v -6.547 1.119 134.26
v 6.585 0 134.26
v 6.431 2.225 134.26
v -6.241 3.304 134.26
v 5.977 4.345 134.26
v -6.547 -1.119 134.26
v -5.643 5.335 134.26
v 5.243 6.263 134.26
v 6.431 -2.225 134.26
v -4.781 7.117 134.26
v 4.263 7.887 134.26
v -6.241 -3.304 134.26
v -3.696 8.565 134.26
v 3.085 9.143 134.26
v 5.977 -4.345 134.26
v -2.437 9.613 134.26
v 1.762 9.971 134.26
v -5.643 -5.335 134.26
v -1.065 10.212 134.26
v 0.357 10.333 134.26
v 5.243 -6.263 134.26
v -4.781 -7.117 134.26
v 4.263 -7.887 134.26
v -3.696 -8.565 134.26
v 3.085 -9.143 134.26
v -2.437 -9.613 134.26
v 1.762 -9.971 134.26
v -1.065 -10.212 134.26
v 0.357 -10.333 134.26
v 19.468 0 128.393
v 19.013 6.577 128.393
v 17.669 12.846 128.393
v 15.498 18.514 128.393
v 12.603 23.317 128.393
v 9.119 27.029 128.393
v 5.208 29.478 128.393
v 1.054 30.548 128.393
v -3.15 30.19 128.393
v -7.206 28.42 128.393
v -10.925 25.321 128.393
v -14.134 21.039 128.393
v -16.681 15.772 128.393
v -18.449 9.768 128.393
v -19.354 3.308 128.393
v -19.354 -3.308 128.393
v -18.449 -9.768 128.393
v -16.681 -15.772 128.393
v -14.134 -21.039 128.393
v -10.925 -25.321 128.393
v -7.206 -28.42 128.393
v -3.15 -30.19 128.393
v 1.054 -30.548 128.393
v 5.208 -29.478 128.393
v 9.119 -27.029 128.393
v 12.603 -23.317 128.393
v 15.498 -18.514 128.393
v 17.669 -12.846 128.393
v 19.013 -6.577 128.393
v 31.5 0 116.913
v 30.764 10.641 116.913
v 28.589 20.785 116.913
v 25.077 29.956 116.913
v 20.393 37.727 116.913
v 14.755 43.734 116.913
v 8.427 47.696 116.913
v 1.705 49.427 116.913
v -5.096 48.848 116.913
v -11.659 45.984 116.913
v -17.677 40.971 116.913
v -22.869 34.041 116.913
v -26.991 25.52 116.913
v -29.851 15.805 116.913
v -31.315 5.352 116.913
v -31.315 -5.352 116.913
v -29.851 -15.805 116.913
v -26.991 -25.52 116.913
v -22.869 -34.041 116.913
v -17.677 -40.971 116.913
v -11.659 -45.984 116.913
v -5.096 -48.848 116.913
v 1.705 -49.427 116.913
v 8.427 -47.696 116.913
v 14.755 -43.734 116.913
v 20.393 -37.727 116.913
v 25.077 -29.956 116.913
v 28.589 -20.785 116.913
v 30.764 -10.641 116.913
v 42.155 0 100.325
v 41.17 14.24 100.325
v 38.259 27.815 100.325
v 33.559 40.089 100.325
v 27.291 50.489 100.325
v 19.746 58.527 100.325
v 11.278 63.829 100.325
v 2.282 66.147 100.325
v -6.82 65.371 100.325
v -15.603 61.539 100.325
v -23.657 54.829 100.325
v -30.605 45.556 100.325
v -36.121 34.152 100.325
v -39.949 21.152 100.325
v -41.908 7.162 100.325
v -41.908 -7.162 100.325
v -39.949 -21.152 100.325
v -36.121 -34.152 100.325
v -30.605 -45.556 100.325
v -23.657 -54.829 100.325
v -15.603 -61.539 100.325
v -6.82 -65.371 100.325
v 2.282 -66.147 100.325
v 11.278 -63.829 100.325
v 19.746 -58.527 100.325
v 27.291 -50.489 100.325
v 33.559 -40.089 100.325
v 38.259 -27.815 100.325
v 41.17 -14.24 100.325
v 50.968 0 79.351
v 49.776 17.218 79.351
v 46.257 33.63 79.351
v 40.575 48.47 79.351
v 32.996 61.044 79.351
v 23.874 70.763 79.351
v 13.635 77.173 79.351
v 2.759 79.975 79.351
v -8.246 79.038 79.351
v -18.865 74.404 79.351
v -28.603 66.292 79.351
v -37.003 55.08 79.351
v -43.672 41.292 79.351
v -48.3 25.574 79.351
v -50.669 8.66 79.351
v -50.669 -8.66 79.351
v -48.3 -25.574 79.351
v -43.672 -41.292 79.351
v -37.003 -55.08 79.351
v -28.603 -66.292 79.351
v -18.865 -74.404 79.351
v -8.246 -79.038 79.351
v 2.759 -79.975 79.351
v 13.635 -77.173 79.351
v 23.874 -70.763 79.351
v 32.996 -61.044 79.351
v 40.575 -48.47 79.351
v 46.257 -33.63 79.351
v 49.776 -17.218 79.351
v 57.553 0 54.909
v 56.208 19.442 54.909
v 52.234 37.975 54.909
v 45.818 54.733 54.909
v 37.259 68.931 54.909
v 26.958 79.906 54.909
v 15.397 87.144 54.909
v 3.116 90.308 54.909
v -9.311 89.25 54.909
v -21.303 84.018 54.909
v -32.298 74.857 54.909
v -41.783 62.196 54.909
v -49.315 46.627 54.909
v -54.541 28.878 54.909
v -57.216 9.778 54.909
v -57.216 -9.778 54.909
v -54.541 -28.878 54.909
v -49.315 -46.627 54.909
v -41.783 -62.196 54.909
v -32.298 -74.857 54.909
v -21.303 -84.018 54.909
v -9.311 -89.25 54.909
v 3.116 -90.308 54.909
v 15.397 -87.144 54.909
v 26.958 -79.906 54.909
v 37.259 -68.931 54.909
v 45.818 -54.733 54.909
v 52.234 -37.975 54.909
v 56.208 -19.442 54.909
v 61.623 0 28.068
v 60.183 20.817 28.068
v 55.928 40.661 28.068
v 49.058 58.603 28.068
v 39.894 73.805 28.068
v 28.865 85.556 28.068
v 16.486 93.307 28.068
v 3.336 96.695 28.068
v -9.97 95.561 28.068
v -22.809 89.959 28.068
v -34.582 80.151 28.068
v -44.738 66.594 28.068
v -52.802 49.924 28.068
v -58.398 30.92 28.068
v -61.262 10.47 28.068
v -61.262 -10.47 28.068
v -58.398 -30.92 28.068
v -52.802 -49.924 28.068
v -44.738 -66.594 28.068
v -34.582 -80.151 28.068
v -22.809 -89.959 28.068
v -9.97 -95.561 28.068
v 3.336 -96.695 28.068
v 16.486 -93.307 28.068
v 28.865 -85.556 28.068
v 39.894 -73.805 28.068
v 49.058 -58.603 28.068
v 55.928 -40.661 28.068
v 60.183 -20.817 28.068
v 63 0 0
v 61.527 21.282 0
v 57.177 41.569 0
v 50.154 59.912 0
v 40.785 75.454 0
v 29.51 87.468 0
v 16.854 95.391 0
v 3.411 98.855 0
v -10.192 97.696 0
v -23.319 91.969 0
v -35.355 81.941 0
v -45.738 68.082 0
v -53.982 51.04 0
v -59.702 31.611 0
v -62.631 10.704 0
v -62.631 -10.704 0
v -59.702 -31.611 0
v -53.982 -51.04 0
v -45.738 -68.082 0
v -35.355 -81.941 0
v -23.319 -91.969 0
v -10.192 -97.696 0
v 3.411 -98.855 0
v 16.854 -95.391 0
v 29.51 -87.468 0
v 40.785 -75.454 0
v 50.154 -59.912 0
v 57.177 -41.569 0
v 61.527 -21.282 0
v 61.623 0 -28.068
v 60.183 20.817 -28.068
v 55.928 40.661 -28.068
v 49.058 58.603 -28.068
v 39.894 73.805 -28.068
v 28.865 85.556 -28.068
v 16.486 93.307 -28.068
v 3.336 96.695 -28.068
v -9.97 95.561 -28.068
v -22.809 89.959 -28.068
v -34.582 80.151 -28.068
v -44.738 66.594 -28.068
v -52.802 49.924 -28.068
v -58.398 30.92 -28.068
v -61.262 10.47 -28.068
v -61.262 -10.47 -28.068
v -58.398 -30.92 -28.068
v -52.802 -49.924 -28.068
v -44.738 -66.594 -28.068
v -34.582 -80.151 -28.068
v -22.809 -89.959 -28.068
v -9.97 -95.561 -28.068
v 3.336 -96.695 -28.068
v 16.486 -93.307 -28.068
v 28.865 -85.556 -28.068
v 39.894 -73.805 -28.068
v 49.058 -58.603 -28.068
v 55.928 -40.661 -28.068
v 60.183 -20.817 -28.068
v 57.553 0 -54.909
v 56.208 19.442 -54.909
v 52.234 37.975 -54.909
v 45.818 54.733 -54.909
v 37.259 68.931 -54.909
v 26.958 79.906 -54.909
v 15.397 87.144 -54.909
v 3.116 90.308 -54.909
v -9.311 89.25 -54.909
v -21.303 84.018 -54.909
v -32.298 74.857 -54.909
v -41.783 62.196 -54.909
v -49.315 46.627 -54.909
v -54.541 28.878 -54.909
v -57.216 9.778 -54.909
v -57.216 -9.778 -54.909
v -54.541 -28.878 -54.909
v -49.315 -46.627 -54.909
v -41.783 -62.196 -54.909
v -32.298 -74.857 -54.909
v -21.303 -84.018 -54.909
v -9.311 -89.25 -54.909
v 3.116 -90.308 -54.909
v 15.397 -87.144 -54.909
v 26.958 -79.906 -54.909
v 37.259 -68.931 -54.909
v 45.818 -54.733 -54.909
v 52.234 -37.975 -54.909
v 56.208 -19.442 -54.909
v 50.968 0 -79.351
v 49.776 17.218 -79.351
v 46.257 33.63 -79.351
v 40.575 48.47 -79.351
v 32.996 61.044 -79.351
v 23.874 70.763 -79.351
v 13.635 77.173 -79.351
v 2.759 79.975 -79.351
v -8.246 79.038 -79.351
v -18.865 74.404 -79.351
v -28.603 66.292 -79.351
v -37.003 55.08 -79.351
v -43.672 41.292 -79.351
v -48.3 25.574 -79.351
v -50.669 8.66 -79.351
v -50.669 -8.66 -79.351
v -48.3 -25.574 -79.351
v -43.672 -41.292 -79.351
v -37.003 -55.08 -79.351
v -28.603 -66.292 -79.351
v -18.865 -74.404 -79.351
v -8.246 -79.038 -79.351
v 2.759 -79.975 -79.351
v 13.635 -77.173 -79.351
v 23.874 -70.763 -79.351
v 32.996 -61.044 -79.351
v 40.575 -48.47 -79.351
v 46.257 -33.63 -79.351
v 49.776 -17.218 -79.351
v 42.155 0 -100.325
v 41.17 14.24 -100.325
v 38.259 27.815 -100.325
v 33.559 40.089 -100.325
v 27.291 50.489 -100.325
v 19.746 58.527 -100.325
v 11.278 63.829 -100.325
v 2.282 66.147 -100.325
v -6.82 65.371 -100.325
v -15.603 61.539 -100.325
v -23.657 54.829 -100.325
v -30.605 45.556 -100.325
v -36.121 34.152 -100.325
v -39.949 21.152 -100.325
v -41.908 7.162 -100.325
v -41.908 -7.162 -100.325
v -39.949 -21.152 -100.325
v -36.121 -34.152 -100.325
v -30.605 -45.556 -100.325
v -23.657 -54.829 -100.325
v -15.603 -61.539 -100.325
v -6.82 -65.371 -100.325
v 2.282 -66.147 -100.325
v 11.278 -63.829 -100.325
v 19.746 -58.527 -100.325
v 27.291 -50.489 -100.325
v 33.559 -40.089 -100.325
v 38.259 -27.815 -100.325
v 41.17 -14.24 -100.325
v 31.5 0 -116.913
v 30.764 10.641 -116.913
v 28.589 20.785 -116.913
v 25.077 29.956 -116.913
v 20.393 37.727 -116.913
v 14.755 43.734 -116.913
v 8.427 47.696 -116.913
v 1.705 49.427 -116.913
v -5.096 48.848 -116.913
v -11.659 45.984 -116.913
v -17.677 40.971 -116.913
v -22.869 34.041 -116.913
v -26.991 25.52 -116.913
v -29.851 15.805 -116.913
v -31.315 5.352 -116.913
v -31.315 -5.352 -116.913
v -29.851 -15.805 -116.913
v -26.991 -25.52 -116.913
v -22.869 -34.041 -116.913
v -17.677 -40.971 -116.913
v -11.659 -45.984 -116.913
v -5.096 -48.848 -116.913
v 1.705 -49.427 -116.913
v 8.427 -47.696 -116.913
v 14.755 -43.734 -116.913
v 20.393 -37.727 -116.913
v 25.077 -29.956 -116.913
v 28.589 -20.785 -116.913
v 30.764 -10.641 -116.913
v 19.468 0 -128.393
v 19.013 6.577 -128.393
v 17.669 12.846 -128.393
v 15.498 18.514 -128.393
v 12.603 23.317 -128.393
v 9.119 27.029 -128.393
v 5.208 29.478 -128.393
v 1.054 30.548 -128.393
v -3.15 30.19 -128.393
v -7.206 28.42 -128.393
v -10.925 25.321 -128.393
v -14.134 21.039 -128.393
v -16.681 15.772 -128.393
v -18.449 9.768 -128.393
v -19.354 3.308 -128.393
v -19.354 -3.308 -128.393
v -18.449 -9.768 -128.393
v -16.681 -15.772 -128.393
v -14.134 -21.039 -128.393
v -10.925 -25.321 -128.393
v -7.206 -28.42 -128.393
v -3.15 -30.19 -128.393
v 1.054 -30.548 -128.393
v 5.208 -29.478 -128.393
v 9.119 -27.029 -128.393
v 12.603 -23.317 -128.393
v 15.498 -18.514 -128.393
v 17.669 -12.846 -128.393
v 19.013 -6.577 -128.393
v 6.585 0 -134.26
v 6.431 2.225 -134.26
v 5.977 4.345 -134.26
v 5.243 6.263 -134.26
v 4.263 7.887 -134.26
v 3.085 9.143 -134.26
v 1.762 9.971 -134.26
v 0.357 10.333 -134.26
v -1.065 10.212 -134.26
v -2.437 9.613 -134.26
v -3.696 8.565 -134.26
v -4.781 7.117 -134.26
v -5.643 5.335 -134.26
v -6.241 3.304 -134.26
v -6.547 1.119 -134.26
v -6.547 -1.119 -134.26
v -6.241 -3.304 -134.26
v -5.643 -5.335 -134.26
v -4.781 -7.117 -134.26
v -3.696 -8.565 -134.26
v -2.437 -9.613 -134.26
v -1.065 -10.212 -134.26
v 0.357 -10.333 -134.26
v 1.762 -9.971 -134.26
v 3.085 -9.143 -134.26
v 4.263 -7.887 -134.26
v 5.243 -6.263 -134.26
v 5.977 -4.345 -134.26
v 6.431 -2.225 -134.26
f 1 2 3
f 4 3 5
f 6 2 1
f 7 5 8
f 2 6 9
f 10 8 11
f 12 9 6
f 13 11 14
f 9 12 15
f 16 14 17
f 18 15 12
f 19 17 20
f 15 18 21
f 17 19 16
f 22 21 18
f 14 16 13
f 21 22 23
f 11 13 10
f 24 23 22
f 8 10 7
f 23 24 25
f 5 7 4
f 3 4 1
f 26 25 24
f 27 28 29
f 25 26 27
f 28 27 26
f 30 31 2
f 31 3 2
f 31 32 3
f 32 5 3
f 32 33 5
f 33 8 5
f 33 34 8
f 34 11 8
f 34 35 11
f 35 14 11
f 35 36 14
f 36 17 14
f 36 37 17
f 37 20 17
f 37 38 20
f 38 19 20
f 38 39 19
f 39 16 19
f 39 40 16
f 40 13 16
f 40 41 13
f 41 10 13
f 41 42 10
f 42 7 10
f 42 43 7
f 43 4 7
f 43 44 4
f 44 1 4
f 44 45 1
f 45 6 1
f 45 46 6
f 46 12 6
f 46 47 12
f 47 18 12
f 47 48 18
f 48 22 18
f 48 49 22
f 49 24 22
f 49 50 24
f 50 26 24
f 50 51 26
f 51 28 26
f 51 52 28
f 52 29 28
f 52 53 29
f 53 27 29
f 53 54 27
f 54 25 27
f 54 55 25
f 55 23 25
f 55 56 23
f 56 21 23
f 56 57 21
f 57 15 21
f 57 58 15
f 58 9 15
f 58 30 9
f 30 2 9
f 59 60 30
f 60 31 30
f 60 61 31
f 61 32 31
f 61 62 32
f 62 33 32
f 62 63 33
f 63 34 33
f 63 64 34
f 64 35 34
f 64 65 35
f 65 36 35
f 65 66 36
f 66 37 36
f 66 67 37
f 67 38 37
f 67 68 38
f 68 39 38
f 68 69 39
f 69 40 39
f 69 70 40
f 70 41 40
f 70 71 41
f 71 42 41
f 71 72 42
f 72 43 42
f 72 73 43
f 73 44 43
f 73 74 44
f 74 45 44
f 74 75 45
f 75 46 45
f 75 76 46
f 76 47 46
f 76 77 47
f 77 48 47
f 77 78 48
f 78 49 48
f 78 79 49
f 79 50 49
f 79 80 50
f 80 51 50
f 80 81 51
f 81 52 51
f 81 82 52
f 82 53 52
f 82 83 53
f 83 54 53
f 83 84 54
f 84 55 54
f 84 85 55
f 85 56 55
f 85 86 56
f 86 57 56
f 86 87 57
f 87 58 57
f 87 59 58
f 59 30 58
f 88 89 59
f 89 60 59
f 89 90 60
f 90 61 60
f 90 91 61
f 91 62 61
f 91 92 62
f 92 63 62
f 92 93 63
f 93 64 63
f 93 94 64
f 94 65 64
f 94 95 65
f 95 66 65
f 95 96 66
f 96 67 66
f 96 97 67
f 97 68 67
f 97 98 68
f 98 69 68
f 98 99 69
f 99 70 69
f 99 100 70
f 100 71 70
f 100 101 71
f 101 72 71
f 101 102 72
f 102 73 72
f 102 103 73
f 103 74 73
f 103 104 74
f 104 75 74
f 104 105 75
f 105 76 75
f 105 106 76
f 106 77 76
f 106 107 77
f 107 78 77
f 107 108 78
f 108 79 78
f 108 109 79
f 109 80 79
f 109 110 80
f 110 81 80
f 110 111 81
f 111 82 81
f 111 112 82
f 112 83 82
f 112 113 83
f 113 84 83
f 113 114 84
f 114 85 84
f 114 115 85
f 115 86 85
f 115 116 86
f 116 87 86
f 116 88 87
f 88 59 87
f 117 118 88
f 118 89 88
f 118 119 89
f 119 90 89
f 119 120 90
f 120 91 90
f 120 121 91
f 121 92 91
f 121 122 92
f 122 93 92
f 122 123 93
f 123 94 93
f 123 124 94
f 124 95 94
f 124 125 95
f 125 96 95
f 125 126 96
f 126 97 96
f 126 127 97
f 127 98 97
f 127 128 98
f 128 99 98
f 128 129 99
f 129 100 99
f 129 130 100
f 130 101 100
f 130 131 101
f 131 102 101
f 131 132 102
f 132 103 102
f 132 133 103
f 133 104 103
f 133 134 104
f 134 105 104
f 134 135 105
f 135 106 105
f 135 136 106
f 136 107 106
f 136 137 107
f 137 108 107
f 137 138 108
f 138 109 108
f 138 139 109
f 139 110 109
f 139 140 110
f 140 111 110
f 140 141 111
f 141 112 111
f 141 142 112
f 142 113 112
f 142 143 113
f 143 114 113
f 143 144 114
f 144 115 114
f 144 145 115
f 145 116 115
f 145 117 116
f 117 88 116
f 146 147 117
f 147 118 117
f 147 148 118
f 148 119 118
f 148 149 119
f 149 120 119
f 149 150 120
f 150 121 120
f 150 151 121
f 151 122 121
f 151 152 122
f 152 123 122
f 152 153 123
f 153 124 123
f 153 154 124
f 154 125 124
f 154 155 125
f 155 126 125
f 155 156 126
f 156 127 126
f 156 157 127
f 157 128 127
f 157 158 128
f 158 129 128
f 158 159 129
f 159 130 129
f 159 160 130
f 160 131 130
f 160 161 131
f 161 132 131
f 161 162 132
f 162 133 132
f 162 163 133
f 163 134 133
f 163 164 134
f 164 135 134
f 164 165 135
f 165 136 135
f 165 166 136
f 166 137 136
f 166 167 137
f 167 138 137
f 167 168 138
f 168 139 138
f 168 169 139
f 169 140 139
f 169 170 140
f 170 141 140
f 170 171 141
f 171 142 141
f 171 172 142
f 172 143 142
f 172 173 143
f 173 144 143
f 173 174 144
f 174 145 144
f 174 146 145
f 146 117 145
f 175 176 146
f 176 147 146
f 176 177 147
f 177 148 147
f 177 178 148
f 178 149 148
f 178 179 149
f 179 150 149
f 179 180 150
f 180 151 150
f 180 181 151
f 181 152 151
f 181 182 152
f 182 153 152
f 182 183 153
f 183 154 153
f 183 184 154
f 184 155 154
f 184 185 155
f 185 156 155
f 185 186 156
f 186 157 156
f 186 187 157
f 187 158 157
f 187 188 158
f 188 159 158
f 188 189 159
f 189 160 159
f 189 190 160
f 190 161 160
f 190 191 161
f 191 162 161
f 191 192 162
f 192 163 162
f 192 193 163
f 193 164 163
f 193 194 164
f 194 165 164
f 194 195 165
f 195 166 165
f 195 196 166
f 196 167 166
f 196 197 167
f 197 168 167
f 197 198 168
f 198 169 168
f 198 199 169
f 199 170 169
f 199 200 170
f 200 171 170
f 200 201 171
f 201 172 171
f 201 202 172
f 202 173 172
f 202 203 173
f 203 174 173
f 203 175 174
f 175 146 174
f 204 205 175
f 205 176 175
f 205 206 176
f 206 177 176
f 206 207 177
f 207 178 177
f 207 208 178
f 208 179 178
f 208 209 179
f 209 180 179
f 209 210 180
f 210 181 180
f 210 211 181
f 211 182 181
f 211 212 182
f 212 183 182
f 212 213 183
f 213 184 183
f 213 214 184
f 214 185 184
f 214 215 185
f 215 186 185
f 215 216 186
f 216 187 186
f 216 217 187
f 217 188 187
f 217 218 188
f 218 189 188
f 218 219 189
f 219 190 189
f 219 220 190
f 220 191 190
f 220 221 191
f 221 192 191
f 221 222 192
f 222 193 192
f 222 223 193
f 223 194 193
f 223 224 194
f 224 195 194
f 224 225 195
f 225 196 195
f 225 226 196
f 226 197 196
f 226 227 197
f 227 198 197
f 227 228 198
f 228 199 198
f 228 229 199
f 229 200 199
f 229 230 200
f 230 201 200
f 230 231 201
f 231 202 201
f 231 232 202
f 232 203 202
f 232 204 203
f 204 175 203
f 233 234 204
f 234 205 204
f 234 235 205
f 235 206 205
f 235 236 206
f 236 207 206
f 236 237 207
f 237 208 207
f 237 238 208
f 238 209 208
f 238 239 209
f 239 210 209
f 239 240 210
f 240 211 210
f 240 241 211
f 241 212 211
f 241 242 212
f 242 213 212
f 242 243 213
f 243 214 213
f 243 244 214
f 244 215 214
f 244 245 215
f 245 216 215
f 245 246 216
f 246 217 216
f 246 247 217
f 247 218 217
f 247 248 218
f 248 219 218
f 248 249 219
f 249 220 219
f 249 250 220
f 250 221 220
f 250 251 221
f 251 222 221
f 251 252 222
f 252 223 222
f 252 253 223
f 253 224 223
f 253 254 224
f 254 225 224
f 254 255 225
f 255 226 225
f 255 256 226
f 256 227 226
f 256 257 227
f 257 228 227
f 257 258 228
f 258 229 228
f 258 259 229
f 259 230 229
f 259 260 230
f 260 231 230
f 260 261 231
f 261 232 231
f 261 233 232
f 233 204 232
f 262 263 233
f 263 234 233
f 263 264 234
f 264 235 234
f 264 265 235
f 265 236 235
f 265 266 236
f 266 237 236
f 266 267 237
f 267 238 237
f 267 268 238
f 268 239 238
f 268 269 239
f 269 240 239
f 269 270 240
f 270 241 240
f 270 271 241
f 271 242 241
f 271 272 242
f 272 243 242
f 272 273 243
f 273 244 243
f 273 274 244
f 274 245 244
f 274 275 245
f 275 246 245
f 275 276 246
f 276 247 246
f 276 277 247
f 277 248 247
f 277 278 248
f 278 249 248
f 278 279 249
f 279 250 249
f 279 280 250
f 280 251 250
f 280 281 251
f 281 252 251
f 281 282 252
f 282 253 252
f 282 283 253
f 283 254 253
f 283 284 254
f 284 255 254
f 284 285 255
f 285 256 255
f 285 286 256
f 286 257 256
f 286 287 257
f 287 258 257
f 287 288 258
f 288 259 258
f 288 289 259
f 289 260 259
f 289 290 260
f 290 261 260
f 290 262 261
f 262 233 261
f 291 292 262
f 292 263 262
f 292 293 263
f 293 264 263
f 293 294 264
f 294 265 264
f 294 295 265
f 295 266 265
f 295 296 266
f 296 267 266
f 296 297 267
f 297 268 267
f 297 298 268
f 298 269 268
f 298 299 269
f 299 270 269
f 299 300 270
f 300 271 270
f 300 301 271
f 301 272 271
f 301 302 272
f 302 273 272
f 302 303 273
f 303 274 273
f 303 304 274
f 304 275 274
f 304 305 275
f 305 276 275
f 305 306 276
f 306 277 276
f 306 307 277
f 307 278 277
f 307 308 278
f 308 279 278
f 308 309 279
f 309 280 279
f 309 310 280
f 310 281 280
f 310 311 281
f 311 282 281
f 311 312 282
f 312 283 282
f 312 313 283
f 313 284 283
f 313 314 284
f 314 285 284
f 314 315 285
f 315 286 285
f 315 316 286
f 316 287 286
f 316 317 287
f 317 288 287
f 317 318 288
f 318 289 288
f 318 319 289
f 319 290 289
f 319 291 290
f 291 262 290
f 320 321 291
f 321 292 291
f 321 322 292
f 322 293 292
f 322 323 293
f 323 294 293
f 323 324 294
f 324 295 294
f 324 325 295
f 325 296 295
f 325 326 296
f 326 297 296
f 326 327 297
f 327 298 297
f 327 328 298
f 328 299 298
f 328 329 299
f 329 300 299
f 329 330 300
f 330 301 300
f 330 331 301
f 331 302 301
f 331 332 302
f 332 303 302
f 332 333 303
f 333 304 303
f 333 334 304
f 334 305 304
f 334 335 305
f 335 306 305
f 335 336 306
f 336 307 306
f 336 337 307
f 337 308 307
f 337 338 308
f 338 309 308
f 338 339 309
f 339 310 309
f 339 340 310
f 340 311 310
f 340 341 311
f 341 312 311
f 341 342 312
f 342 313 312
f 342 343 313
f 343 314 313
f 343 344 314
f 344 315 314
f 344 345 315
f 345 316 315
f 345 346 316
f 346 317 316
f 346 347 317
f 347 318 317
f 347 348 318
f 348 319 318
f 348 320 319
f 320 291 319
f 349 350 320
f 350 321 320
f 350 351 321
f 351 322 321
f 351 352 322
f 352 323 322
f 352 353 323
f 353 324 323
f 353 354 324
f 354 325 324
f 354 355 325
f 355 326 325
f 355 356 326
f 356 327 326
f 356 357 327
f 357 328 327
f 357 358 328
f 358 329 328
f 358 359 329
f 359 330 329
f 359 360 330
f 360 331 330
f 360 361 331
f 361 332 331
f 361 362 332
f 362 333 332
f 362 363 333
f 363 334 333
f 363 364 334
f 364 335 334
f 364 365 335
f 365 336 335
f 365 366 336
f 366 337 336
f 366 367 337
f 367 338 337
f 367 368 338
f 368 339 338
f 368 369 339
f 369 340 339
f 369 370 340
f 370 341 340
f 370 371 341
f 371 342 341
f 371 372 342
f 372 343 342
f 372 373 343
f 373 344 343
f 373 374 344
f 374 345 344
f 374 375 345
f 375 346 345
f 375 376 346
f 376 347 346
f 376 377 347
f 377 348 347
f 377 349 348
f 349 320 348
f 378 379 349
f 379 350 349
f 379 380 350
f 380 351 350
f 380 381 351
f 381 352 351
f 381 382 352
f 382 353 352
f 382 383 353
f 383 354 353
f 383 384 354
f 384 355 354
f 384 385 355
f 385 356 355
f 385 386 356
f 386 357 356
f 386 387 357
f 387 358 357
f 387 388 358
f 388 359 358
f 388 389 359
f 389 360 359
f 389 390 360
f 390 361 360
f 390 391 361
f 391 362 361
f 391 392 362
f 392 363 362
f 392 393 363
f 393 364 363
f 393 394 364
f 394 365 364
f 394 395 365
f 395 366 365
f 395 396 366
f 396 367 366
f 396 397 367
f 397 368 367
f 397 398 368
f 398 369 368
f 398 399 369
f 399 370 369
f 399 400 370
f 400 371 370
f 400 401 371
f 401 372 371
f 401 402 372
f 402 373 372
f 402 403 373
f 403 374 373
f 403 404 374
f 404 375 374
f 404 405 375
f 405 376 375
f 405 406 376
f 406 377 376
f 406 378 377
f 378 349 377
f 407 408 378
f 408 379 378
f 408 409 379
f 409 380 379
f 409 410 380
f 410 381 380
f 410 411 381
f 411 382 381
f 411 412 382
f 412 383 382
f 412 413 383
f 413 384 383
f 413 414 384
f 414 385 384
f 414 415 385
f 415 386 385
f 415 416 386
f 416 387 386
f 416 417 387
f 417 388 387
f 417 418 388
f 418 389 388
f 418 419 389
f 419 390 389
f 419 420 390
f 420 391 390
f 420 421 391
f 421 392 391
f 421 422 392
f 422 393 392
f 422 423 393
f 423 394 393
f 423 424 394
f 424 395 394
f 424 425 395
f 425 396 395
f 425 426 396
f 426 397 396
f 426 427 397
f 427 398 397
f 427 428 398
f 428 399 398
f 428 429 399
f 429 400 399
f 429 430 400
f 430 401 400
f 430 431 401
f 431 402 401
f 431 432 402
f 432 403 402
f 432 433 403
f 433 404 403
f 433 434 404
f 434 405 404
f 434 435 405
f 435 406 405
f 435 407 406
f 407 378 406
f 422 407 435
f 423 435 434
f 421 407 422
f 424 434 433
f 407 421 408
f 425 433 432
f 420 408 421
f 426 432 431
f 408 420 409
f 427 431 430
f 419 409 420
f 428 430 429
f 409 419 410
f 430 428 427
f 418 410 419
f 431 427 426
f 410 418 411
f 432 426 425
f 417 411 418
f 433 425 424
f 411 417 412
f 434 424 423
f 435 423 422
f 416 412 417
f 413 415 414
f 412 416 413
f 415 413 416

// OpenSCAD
// Generated by SolidPython 1.0.1 on 2020-07-29 00:46:47


scale(v = [7, 11, 15]) {
	sphere(r = 9);
}
/***********************************************
*********      SolidPython code:      **********
************************************************
 
# import packages: SolidPython
from solid import *
from solid.utils import *
from itertools import chain, combinations, permutations


class Resize:

    def __init__(self, scad_file):
        self.scad_file = scad_file
        #self.scad_file = import_scad(scad_file)
        # cone/cylinder param:
        self.r1 = 0
        self.r2 = 0
        self.h = 0
        # rectangular prism param:
        self.w = 0
        self.l = 0
        # ellipse param:
        self.r = 0

    # import OpenScad code (file name corresponds to shape)


    # classify shape + parameters
    def assign(self, param1, param2, param3):
        if self.scad_file == 'cone.scad':
            self.r1 = param1
            self.r2 = param2
            self.h = param3
        elif self.scad_file == 'cylinder.scad':
            self.r1 = param1
            self.r2 = param2
            self.h = param3
        elif self.scad_file == 'rectangularPrism.scad':
            self.h = param1
            self.l = param2
            self.w = param3
        else:
            self.r = param1
            self.h = param2

    # resize parameters
    def iterate(self):
        x = range(3, 20, 2)
        i = 1
        if self.scad_file == 'cone.scad':
            tempList = list(permutations(x, 2))
            for temp in tempList:
                param1 = temp[0]
                param2 = temp[1]
                filepath = 'produced_scad_files/' + 'cone' + str(param1) + '_' + str(param2) + '_' + '.scad'
                scad_render_to_file(cylinder(h=param1, r1=param2, r2=0), filepath)

        elif self.scad_file == 'cylinder.scad':
            tempList = list(permutations(x, 3))
            for temp in tempList:
                param1 = temp[0]
                param2 = temp[1]
                filepath = 'produced_scad_files/' + 'cylinder' + str(param1) + '_' + str(param2) + '_' + '.scad'
                scad_render_to_file(cylinder(h=param1, r1=param2, r2=param2), filepath)

        elif self.scad_file == 'rectangularPrism.scad':
            tempList = list(permutations(x, 3))
            for temp in tempList:
                param1 = temp[0]
                param2 = temp[1]
                param3 = temp[2]
                filepath = 'produced_scad_files/' + 'rectangularPrism' + str(param1) + '_' + str(param2) + '_' + str(
                    param3) + '.scad'
                scad_render_to_file(cube(size=(param1, param2, param3)), filepath)

        elif self.scad_file == 'ellipse.scad':
            tempList = list(permutations(x, 4))
            for temp in tempList:
                param1 = temp[0]
                param2 = temp[1]
                param3 = temp[2]
                param4 = temp[3]
                filepath = 'produced_scad_files/' + 'ellipse' + str(param1) + '_' + str(param2) + '_' + str(param3) + '_' + str(param4) + '.scad'
                scad_render_to_file(scale([param1, param2, param3])(sphere(r=param4)), filepath)

    def render_to_scadfile(self):
        scad_render_to_file(scad, 'example.scad') 
 
************************************************/
